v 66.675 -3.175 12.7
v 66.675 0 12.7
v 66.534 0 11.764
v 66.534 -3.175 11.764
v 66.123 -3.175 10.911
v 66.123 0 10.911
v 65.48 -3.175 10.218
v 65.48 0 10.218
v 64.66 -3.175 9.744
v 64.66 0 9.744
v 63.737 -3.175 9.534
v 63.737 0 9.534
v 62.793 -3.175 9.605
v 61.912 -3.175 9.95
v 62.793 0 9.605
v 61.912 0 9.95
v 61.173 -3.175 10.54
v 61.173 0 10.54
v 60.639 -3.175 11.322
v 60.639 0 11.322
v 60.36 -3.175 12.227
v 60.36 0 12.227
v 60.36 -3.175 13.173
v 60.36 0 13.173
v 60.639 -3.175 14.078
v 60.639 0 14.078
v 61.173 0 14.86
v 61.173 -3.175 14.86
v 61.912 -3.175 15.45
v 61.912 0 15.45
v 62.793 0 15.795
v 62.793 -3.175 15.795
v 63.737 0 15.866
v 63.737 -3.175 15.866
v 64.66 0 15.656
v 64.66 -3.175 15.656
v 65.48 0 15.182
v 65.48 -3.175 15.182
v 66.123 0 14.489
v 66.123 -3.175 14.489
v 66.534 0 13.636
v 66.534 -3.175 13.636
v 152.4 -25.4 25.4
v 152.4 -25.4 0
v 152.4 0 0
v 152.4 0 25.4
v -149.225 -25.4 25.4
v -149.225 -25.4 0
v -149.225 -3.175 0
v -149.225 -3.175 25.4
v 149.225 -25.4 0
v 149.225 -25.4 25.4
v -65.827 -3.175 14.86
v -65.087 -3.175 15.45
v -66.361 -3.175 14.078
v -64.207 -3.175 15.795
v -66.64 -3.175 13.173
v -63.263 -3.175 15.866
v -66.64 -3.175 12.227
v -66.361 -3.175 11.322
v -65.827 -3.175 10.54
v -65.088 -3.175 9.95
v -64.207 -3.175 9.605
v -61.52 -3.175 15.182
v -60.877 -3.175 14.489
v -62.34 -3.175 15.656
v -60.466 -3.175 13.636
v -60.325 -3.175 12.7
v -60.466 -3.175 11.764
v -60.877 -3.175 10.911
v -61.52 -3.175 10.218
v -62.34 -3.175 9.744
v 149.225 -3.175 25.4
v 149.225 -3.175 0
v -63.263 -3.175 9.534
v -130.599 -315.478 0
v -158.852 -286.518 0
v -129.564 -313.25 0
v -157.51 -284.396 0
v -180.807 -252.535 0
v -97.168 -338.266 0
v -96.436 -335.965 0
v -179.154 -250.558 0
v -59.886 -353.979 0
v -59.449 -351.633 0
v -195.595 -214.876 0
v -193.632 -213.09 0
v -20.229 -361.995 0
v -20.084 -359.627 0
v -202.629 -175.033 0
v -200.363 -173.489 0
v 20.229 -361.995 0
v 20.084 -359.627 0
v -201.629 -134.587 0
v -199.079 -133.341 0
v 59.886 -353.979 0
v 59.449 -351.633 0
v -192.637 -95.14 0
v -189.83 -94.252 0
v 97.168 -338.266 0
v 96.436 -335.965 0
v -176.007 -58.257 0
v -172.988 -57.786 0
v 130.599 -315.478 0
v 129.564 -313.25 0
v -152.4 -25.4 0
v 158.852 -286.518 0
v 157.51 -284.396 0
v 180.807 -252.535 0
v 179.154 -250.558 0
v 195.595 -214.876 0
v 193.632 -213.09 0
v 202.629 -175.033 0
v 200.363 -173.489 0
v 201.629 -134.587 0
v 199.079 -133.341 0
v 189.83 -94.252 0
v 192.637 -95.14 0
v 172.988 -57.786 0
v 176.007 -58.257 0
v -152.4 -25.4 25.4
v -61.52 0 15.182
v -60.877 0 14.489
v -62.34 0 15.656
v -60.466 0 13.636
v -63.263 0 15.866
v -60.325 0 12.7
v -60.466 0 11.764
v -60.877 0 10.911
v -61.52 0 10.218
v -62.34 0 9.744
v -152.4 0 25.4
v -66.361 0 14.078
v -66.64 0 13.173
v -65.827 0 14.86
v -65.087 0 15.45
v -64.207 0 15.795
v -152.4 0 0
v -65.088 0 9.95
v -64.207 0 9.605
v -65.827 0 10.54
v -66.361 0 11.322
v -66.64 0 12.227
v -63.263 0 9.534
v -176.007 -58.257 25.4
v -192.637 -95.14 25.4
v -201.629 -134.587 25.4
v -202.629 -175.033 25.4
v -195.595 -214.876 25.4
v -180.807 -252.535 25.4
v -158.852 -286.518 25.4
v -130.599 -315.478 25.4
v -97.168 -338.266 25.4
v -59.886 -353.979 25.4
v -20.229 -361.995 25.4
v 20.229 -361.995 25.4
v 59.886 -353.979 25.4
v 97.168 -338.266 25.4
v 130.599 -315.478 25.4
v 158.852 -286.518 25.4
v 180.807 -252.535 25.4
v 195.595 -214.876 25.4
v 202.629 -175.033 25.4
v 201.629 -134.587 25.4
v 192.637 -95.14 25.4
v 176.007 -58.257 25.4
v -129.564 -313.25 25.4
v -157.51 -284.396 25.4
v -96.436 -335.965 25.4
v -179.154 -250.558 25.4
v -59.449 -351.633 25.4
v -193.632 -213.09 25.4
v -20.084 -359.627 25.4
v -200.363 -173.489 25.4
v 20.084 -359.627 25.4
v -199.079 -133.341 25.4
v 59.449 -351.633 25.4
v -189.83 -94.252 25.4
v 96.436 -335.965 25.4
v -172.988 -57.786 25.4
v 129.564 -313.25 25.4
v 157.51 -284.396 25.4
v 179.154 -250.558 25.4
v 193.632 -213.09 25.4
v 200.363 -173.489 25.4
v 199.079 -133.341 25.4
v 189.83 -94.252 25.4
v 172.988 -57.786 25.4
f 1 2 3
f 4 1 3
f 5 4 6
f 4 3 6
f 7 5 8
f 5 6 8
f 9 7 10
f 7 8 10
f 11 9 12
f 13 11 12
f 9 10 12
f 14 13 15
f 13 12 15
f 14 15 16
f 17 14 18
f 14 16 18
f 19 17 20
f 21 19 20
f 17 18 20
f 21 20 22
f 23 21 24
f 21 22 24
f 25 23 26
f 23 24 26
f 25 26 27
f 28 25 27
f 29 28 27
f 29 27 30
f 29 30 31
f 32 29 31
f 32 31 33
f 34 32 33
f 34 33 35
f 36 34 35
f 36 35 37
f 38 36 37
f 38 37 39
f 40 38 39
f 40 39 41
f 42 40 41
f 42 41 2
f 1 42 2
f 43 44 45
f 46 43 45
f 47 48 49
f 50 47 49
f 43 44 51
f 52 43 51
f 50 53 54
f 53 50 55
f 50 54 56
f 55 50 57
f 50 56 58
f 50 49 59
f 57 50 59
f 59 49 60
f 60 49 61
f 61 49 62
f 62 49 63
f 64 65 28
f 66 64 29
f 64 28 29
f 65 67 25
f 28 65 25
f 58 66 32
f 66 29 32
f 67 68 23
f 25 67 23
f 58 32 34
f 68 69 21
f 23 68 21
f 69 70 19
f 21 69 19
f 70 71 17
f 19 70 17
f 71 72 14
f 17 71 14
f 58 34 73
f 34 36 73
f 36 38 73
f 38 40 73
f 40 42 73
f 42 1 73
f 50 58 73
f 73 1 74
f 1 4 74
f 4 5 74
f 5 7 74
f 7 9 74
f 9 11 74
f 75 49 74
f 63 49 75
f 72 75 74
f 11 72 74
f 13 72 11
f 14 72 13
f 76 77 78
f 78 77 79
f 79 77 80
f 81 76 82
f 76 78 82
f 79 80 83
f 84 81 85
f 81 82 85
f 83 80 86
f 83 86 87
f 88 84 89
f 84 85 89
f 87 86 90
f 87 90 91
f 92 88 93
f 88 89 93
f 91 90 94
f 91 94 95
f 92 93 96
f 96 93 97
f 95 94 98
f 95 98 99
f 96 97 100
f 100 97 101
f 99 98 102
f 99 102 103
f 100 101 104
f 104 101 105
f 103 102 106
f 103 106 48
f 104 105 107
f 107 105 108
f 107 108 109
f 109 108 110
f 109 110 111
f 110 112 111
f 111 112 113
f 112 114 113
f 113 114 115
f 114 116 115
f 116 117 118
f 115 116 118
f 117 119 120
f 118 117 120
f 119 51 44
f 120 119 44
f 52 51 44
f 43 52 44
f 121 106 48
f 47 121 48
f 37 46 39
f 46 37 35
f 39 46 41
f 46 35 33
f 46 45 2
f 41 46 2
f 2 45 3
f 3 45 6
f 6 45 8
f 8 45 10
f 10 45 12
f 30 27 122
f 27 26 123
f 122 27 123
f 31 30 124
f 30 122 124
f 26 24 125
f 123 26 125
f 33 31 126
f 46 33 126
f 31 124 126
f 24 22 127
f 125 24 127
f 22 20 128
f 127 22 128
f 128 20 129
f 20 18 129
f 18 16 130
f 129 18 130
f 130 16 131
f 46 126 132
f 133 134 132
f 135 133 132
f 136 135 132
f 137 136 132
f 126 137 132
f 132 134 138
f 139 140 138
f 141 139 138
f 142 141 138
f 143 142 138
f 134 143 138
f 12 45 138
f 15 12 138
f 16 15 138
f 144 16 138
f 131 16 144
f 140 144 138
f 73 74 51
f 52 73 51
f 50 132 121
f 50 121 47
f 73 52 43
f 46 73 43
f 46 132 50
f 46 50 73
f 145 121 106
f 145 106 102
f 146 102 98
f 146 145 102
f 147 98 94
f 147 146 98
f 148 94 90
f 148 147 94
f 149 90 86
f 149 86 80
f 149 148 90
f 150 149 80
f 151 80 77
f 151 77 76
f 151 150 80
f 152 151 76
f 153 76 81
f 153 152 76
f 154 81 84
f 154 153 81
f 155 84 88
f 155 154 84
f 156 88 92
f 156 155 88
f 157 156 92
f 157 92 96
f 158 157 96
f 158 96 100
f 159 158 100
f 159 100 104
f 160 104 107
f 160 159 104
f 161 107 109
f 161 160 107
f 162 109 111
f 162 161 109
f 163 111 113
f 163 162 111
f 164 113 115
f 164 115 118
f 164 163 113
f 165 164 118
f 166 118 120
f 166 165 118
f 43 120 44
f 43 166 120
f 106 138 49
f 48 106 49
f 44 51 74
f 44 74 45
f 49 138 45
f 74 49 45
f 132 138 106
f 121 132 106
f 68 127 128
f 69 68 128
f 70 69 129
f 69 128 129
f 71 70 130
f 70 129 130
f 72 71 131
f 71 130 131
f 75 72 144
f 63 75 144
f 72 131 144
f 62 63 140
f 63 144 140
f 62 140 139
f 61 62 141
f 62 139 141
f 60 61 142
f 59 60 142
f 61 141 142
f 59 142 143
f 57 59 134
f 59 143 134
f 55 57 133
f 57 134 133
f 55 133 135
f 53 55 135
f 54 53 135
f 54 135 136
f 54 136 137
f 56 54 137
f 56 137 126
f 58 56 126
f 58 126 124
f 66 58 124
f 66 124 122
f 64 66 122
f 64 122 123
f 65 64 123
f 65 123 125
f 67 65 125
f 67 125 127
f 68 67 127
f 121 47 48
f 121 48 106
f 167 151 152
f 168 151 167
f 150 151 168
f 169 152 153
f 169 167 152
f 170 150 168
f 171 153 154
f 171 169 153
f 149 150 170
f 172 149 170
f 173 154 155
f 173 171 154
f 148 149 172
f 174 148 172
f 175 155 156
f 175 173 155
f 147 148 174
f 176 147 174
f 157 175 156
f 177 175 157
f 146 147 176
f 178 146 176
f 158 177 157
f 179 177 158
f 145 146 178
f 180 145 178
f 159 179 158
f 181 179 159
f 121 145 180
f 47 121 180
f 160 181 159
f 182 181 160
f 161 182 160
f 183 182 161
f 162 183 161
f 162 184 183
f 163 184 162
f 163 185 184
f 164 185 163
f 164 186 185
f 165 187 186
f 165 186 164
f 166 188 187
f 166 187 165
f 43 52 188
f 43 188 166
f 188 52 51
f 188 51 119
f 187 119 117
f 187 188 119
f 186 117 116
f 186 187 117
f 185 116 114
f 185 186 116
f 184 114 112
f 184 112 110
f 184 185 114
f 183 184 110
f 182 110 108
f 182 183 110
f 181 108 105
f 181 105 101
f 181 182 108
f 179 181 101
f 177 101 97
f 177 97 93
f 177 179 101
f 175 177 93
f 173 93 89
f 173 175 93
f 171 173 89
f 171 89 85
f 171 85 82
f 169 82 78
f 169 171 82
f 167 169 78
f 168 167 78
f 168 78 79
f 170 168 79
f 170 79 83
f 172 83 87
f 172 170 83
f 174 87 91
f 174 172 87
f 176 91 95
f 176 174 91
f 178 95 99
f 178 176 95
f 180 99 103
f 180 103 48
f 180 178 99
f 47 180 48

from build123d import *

# Parameters (mm, degrees)
F1_DEPTH = 25.4
F3_DEPTH = 25.4
F5_DEPTH = 363.0051666021


with BuildPart() as f1:
    # F0 (on Top) → F1 (new body)
    with BuildSketch(Plane.XY):
        Polygon((152.4, 0), (-152.4, 0), (-152.4, -25.4), (-149.225, -25.4), (-149.225, -3.175), (149.225, -3.175), (149.225, -25.4), (152.4, -25.4), align=None)
    extrude(amount=F1_DEPTH)

    # F4 (on face) → F5 (cut, through all)
    with BuildSketch(Plane(origin=(0, 0, 0), x_dir=(-1, 0, 0), z_dir=(0, 1, 0))):
        with BuildLine():
            ThreePointArc((-60.325, 12.7), (-63.5, 15.875), (-66.675, 12.7))
            Line((-66.675, 12.7), (-60.325, 12.7))
        make_face()
        with BuildLine():
            ThreePointArc((66.675, 12.7), (63.5, 15.875), (60.325, 12.7))
            Line((60.325, 12.7), (66.675, 12.7))
        make_face()
        with BuildLine():
            Line((66.675, 12.7), (60.325, 12.7))
            ThreePointArc((60.325, 12.7), (63.5, 9.525), (66.675, 12.7))
        make_face()
        with BuildLine():
            Line((-60.325, 12.7), (-66.675, 12.7))
            ThreePointArc((-66.675, 12.7), (-63.5, 9.525), (-60.325, 12.7))
        make_face()
    extrude(amount=-F5_DEPTH, mode=Mode.SUBTRACT)


with BuildPart() as f3:
    # F2 (on face) → F3 (new body)
    with BuildSketch(Plane.XY.offset(25.4)):
        with BuildLine():
            Line((-149.225, -25.4), (-152.4, -25.4))
            ThreePointArc((-152.4, -25.4), (0, -363.0041666021), (152.4, -25.4))
            Line((152.4, -25.4), (149.225, -25.4))
            ThreePointArc((149.225, -25.4), (0, -360.6338970331), (-149.225, -25.4))
        make_face()
    extrude(amount=-F3_DEPTH)


solid = Compound([f1.part, f3.part])
